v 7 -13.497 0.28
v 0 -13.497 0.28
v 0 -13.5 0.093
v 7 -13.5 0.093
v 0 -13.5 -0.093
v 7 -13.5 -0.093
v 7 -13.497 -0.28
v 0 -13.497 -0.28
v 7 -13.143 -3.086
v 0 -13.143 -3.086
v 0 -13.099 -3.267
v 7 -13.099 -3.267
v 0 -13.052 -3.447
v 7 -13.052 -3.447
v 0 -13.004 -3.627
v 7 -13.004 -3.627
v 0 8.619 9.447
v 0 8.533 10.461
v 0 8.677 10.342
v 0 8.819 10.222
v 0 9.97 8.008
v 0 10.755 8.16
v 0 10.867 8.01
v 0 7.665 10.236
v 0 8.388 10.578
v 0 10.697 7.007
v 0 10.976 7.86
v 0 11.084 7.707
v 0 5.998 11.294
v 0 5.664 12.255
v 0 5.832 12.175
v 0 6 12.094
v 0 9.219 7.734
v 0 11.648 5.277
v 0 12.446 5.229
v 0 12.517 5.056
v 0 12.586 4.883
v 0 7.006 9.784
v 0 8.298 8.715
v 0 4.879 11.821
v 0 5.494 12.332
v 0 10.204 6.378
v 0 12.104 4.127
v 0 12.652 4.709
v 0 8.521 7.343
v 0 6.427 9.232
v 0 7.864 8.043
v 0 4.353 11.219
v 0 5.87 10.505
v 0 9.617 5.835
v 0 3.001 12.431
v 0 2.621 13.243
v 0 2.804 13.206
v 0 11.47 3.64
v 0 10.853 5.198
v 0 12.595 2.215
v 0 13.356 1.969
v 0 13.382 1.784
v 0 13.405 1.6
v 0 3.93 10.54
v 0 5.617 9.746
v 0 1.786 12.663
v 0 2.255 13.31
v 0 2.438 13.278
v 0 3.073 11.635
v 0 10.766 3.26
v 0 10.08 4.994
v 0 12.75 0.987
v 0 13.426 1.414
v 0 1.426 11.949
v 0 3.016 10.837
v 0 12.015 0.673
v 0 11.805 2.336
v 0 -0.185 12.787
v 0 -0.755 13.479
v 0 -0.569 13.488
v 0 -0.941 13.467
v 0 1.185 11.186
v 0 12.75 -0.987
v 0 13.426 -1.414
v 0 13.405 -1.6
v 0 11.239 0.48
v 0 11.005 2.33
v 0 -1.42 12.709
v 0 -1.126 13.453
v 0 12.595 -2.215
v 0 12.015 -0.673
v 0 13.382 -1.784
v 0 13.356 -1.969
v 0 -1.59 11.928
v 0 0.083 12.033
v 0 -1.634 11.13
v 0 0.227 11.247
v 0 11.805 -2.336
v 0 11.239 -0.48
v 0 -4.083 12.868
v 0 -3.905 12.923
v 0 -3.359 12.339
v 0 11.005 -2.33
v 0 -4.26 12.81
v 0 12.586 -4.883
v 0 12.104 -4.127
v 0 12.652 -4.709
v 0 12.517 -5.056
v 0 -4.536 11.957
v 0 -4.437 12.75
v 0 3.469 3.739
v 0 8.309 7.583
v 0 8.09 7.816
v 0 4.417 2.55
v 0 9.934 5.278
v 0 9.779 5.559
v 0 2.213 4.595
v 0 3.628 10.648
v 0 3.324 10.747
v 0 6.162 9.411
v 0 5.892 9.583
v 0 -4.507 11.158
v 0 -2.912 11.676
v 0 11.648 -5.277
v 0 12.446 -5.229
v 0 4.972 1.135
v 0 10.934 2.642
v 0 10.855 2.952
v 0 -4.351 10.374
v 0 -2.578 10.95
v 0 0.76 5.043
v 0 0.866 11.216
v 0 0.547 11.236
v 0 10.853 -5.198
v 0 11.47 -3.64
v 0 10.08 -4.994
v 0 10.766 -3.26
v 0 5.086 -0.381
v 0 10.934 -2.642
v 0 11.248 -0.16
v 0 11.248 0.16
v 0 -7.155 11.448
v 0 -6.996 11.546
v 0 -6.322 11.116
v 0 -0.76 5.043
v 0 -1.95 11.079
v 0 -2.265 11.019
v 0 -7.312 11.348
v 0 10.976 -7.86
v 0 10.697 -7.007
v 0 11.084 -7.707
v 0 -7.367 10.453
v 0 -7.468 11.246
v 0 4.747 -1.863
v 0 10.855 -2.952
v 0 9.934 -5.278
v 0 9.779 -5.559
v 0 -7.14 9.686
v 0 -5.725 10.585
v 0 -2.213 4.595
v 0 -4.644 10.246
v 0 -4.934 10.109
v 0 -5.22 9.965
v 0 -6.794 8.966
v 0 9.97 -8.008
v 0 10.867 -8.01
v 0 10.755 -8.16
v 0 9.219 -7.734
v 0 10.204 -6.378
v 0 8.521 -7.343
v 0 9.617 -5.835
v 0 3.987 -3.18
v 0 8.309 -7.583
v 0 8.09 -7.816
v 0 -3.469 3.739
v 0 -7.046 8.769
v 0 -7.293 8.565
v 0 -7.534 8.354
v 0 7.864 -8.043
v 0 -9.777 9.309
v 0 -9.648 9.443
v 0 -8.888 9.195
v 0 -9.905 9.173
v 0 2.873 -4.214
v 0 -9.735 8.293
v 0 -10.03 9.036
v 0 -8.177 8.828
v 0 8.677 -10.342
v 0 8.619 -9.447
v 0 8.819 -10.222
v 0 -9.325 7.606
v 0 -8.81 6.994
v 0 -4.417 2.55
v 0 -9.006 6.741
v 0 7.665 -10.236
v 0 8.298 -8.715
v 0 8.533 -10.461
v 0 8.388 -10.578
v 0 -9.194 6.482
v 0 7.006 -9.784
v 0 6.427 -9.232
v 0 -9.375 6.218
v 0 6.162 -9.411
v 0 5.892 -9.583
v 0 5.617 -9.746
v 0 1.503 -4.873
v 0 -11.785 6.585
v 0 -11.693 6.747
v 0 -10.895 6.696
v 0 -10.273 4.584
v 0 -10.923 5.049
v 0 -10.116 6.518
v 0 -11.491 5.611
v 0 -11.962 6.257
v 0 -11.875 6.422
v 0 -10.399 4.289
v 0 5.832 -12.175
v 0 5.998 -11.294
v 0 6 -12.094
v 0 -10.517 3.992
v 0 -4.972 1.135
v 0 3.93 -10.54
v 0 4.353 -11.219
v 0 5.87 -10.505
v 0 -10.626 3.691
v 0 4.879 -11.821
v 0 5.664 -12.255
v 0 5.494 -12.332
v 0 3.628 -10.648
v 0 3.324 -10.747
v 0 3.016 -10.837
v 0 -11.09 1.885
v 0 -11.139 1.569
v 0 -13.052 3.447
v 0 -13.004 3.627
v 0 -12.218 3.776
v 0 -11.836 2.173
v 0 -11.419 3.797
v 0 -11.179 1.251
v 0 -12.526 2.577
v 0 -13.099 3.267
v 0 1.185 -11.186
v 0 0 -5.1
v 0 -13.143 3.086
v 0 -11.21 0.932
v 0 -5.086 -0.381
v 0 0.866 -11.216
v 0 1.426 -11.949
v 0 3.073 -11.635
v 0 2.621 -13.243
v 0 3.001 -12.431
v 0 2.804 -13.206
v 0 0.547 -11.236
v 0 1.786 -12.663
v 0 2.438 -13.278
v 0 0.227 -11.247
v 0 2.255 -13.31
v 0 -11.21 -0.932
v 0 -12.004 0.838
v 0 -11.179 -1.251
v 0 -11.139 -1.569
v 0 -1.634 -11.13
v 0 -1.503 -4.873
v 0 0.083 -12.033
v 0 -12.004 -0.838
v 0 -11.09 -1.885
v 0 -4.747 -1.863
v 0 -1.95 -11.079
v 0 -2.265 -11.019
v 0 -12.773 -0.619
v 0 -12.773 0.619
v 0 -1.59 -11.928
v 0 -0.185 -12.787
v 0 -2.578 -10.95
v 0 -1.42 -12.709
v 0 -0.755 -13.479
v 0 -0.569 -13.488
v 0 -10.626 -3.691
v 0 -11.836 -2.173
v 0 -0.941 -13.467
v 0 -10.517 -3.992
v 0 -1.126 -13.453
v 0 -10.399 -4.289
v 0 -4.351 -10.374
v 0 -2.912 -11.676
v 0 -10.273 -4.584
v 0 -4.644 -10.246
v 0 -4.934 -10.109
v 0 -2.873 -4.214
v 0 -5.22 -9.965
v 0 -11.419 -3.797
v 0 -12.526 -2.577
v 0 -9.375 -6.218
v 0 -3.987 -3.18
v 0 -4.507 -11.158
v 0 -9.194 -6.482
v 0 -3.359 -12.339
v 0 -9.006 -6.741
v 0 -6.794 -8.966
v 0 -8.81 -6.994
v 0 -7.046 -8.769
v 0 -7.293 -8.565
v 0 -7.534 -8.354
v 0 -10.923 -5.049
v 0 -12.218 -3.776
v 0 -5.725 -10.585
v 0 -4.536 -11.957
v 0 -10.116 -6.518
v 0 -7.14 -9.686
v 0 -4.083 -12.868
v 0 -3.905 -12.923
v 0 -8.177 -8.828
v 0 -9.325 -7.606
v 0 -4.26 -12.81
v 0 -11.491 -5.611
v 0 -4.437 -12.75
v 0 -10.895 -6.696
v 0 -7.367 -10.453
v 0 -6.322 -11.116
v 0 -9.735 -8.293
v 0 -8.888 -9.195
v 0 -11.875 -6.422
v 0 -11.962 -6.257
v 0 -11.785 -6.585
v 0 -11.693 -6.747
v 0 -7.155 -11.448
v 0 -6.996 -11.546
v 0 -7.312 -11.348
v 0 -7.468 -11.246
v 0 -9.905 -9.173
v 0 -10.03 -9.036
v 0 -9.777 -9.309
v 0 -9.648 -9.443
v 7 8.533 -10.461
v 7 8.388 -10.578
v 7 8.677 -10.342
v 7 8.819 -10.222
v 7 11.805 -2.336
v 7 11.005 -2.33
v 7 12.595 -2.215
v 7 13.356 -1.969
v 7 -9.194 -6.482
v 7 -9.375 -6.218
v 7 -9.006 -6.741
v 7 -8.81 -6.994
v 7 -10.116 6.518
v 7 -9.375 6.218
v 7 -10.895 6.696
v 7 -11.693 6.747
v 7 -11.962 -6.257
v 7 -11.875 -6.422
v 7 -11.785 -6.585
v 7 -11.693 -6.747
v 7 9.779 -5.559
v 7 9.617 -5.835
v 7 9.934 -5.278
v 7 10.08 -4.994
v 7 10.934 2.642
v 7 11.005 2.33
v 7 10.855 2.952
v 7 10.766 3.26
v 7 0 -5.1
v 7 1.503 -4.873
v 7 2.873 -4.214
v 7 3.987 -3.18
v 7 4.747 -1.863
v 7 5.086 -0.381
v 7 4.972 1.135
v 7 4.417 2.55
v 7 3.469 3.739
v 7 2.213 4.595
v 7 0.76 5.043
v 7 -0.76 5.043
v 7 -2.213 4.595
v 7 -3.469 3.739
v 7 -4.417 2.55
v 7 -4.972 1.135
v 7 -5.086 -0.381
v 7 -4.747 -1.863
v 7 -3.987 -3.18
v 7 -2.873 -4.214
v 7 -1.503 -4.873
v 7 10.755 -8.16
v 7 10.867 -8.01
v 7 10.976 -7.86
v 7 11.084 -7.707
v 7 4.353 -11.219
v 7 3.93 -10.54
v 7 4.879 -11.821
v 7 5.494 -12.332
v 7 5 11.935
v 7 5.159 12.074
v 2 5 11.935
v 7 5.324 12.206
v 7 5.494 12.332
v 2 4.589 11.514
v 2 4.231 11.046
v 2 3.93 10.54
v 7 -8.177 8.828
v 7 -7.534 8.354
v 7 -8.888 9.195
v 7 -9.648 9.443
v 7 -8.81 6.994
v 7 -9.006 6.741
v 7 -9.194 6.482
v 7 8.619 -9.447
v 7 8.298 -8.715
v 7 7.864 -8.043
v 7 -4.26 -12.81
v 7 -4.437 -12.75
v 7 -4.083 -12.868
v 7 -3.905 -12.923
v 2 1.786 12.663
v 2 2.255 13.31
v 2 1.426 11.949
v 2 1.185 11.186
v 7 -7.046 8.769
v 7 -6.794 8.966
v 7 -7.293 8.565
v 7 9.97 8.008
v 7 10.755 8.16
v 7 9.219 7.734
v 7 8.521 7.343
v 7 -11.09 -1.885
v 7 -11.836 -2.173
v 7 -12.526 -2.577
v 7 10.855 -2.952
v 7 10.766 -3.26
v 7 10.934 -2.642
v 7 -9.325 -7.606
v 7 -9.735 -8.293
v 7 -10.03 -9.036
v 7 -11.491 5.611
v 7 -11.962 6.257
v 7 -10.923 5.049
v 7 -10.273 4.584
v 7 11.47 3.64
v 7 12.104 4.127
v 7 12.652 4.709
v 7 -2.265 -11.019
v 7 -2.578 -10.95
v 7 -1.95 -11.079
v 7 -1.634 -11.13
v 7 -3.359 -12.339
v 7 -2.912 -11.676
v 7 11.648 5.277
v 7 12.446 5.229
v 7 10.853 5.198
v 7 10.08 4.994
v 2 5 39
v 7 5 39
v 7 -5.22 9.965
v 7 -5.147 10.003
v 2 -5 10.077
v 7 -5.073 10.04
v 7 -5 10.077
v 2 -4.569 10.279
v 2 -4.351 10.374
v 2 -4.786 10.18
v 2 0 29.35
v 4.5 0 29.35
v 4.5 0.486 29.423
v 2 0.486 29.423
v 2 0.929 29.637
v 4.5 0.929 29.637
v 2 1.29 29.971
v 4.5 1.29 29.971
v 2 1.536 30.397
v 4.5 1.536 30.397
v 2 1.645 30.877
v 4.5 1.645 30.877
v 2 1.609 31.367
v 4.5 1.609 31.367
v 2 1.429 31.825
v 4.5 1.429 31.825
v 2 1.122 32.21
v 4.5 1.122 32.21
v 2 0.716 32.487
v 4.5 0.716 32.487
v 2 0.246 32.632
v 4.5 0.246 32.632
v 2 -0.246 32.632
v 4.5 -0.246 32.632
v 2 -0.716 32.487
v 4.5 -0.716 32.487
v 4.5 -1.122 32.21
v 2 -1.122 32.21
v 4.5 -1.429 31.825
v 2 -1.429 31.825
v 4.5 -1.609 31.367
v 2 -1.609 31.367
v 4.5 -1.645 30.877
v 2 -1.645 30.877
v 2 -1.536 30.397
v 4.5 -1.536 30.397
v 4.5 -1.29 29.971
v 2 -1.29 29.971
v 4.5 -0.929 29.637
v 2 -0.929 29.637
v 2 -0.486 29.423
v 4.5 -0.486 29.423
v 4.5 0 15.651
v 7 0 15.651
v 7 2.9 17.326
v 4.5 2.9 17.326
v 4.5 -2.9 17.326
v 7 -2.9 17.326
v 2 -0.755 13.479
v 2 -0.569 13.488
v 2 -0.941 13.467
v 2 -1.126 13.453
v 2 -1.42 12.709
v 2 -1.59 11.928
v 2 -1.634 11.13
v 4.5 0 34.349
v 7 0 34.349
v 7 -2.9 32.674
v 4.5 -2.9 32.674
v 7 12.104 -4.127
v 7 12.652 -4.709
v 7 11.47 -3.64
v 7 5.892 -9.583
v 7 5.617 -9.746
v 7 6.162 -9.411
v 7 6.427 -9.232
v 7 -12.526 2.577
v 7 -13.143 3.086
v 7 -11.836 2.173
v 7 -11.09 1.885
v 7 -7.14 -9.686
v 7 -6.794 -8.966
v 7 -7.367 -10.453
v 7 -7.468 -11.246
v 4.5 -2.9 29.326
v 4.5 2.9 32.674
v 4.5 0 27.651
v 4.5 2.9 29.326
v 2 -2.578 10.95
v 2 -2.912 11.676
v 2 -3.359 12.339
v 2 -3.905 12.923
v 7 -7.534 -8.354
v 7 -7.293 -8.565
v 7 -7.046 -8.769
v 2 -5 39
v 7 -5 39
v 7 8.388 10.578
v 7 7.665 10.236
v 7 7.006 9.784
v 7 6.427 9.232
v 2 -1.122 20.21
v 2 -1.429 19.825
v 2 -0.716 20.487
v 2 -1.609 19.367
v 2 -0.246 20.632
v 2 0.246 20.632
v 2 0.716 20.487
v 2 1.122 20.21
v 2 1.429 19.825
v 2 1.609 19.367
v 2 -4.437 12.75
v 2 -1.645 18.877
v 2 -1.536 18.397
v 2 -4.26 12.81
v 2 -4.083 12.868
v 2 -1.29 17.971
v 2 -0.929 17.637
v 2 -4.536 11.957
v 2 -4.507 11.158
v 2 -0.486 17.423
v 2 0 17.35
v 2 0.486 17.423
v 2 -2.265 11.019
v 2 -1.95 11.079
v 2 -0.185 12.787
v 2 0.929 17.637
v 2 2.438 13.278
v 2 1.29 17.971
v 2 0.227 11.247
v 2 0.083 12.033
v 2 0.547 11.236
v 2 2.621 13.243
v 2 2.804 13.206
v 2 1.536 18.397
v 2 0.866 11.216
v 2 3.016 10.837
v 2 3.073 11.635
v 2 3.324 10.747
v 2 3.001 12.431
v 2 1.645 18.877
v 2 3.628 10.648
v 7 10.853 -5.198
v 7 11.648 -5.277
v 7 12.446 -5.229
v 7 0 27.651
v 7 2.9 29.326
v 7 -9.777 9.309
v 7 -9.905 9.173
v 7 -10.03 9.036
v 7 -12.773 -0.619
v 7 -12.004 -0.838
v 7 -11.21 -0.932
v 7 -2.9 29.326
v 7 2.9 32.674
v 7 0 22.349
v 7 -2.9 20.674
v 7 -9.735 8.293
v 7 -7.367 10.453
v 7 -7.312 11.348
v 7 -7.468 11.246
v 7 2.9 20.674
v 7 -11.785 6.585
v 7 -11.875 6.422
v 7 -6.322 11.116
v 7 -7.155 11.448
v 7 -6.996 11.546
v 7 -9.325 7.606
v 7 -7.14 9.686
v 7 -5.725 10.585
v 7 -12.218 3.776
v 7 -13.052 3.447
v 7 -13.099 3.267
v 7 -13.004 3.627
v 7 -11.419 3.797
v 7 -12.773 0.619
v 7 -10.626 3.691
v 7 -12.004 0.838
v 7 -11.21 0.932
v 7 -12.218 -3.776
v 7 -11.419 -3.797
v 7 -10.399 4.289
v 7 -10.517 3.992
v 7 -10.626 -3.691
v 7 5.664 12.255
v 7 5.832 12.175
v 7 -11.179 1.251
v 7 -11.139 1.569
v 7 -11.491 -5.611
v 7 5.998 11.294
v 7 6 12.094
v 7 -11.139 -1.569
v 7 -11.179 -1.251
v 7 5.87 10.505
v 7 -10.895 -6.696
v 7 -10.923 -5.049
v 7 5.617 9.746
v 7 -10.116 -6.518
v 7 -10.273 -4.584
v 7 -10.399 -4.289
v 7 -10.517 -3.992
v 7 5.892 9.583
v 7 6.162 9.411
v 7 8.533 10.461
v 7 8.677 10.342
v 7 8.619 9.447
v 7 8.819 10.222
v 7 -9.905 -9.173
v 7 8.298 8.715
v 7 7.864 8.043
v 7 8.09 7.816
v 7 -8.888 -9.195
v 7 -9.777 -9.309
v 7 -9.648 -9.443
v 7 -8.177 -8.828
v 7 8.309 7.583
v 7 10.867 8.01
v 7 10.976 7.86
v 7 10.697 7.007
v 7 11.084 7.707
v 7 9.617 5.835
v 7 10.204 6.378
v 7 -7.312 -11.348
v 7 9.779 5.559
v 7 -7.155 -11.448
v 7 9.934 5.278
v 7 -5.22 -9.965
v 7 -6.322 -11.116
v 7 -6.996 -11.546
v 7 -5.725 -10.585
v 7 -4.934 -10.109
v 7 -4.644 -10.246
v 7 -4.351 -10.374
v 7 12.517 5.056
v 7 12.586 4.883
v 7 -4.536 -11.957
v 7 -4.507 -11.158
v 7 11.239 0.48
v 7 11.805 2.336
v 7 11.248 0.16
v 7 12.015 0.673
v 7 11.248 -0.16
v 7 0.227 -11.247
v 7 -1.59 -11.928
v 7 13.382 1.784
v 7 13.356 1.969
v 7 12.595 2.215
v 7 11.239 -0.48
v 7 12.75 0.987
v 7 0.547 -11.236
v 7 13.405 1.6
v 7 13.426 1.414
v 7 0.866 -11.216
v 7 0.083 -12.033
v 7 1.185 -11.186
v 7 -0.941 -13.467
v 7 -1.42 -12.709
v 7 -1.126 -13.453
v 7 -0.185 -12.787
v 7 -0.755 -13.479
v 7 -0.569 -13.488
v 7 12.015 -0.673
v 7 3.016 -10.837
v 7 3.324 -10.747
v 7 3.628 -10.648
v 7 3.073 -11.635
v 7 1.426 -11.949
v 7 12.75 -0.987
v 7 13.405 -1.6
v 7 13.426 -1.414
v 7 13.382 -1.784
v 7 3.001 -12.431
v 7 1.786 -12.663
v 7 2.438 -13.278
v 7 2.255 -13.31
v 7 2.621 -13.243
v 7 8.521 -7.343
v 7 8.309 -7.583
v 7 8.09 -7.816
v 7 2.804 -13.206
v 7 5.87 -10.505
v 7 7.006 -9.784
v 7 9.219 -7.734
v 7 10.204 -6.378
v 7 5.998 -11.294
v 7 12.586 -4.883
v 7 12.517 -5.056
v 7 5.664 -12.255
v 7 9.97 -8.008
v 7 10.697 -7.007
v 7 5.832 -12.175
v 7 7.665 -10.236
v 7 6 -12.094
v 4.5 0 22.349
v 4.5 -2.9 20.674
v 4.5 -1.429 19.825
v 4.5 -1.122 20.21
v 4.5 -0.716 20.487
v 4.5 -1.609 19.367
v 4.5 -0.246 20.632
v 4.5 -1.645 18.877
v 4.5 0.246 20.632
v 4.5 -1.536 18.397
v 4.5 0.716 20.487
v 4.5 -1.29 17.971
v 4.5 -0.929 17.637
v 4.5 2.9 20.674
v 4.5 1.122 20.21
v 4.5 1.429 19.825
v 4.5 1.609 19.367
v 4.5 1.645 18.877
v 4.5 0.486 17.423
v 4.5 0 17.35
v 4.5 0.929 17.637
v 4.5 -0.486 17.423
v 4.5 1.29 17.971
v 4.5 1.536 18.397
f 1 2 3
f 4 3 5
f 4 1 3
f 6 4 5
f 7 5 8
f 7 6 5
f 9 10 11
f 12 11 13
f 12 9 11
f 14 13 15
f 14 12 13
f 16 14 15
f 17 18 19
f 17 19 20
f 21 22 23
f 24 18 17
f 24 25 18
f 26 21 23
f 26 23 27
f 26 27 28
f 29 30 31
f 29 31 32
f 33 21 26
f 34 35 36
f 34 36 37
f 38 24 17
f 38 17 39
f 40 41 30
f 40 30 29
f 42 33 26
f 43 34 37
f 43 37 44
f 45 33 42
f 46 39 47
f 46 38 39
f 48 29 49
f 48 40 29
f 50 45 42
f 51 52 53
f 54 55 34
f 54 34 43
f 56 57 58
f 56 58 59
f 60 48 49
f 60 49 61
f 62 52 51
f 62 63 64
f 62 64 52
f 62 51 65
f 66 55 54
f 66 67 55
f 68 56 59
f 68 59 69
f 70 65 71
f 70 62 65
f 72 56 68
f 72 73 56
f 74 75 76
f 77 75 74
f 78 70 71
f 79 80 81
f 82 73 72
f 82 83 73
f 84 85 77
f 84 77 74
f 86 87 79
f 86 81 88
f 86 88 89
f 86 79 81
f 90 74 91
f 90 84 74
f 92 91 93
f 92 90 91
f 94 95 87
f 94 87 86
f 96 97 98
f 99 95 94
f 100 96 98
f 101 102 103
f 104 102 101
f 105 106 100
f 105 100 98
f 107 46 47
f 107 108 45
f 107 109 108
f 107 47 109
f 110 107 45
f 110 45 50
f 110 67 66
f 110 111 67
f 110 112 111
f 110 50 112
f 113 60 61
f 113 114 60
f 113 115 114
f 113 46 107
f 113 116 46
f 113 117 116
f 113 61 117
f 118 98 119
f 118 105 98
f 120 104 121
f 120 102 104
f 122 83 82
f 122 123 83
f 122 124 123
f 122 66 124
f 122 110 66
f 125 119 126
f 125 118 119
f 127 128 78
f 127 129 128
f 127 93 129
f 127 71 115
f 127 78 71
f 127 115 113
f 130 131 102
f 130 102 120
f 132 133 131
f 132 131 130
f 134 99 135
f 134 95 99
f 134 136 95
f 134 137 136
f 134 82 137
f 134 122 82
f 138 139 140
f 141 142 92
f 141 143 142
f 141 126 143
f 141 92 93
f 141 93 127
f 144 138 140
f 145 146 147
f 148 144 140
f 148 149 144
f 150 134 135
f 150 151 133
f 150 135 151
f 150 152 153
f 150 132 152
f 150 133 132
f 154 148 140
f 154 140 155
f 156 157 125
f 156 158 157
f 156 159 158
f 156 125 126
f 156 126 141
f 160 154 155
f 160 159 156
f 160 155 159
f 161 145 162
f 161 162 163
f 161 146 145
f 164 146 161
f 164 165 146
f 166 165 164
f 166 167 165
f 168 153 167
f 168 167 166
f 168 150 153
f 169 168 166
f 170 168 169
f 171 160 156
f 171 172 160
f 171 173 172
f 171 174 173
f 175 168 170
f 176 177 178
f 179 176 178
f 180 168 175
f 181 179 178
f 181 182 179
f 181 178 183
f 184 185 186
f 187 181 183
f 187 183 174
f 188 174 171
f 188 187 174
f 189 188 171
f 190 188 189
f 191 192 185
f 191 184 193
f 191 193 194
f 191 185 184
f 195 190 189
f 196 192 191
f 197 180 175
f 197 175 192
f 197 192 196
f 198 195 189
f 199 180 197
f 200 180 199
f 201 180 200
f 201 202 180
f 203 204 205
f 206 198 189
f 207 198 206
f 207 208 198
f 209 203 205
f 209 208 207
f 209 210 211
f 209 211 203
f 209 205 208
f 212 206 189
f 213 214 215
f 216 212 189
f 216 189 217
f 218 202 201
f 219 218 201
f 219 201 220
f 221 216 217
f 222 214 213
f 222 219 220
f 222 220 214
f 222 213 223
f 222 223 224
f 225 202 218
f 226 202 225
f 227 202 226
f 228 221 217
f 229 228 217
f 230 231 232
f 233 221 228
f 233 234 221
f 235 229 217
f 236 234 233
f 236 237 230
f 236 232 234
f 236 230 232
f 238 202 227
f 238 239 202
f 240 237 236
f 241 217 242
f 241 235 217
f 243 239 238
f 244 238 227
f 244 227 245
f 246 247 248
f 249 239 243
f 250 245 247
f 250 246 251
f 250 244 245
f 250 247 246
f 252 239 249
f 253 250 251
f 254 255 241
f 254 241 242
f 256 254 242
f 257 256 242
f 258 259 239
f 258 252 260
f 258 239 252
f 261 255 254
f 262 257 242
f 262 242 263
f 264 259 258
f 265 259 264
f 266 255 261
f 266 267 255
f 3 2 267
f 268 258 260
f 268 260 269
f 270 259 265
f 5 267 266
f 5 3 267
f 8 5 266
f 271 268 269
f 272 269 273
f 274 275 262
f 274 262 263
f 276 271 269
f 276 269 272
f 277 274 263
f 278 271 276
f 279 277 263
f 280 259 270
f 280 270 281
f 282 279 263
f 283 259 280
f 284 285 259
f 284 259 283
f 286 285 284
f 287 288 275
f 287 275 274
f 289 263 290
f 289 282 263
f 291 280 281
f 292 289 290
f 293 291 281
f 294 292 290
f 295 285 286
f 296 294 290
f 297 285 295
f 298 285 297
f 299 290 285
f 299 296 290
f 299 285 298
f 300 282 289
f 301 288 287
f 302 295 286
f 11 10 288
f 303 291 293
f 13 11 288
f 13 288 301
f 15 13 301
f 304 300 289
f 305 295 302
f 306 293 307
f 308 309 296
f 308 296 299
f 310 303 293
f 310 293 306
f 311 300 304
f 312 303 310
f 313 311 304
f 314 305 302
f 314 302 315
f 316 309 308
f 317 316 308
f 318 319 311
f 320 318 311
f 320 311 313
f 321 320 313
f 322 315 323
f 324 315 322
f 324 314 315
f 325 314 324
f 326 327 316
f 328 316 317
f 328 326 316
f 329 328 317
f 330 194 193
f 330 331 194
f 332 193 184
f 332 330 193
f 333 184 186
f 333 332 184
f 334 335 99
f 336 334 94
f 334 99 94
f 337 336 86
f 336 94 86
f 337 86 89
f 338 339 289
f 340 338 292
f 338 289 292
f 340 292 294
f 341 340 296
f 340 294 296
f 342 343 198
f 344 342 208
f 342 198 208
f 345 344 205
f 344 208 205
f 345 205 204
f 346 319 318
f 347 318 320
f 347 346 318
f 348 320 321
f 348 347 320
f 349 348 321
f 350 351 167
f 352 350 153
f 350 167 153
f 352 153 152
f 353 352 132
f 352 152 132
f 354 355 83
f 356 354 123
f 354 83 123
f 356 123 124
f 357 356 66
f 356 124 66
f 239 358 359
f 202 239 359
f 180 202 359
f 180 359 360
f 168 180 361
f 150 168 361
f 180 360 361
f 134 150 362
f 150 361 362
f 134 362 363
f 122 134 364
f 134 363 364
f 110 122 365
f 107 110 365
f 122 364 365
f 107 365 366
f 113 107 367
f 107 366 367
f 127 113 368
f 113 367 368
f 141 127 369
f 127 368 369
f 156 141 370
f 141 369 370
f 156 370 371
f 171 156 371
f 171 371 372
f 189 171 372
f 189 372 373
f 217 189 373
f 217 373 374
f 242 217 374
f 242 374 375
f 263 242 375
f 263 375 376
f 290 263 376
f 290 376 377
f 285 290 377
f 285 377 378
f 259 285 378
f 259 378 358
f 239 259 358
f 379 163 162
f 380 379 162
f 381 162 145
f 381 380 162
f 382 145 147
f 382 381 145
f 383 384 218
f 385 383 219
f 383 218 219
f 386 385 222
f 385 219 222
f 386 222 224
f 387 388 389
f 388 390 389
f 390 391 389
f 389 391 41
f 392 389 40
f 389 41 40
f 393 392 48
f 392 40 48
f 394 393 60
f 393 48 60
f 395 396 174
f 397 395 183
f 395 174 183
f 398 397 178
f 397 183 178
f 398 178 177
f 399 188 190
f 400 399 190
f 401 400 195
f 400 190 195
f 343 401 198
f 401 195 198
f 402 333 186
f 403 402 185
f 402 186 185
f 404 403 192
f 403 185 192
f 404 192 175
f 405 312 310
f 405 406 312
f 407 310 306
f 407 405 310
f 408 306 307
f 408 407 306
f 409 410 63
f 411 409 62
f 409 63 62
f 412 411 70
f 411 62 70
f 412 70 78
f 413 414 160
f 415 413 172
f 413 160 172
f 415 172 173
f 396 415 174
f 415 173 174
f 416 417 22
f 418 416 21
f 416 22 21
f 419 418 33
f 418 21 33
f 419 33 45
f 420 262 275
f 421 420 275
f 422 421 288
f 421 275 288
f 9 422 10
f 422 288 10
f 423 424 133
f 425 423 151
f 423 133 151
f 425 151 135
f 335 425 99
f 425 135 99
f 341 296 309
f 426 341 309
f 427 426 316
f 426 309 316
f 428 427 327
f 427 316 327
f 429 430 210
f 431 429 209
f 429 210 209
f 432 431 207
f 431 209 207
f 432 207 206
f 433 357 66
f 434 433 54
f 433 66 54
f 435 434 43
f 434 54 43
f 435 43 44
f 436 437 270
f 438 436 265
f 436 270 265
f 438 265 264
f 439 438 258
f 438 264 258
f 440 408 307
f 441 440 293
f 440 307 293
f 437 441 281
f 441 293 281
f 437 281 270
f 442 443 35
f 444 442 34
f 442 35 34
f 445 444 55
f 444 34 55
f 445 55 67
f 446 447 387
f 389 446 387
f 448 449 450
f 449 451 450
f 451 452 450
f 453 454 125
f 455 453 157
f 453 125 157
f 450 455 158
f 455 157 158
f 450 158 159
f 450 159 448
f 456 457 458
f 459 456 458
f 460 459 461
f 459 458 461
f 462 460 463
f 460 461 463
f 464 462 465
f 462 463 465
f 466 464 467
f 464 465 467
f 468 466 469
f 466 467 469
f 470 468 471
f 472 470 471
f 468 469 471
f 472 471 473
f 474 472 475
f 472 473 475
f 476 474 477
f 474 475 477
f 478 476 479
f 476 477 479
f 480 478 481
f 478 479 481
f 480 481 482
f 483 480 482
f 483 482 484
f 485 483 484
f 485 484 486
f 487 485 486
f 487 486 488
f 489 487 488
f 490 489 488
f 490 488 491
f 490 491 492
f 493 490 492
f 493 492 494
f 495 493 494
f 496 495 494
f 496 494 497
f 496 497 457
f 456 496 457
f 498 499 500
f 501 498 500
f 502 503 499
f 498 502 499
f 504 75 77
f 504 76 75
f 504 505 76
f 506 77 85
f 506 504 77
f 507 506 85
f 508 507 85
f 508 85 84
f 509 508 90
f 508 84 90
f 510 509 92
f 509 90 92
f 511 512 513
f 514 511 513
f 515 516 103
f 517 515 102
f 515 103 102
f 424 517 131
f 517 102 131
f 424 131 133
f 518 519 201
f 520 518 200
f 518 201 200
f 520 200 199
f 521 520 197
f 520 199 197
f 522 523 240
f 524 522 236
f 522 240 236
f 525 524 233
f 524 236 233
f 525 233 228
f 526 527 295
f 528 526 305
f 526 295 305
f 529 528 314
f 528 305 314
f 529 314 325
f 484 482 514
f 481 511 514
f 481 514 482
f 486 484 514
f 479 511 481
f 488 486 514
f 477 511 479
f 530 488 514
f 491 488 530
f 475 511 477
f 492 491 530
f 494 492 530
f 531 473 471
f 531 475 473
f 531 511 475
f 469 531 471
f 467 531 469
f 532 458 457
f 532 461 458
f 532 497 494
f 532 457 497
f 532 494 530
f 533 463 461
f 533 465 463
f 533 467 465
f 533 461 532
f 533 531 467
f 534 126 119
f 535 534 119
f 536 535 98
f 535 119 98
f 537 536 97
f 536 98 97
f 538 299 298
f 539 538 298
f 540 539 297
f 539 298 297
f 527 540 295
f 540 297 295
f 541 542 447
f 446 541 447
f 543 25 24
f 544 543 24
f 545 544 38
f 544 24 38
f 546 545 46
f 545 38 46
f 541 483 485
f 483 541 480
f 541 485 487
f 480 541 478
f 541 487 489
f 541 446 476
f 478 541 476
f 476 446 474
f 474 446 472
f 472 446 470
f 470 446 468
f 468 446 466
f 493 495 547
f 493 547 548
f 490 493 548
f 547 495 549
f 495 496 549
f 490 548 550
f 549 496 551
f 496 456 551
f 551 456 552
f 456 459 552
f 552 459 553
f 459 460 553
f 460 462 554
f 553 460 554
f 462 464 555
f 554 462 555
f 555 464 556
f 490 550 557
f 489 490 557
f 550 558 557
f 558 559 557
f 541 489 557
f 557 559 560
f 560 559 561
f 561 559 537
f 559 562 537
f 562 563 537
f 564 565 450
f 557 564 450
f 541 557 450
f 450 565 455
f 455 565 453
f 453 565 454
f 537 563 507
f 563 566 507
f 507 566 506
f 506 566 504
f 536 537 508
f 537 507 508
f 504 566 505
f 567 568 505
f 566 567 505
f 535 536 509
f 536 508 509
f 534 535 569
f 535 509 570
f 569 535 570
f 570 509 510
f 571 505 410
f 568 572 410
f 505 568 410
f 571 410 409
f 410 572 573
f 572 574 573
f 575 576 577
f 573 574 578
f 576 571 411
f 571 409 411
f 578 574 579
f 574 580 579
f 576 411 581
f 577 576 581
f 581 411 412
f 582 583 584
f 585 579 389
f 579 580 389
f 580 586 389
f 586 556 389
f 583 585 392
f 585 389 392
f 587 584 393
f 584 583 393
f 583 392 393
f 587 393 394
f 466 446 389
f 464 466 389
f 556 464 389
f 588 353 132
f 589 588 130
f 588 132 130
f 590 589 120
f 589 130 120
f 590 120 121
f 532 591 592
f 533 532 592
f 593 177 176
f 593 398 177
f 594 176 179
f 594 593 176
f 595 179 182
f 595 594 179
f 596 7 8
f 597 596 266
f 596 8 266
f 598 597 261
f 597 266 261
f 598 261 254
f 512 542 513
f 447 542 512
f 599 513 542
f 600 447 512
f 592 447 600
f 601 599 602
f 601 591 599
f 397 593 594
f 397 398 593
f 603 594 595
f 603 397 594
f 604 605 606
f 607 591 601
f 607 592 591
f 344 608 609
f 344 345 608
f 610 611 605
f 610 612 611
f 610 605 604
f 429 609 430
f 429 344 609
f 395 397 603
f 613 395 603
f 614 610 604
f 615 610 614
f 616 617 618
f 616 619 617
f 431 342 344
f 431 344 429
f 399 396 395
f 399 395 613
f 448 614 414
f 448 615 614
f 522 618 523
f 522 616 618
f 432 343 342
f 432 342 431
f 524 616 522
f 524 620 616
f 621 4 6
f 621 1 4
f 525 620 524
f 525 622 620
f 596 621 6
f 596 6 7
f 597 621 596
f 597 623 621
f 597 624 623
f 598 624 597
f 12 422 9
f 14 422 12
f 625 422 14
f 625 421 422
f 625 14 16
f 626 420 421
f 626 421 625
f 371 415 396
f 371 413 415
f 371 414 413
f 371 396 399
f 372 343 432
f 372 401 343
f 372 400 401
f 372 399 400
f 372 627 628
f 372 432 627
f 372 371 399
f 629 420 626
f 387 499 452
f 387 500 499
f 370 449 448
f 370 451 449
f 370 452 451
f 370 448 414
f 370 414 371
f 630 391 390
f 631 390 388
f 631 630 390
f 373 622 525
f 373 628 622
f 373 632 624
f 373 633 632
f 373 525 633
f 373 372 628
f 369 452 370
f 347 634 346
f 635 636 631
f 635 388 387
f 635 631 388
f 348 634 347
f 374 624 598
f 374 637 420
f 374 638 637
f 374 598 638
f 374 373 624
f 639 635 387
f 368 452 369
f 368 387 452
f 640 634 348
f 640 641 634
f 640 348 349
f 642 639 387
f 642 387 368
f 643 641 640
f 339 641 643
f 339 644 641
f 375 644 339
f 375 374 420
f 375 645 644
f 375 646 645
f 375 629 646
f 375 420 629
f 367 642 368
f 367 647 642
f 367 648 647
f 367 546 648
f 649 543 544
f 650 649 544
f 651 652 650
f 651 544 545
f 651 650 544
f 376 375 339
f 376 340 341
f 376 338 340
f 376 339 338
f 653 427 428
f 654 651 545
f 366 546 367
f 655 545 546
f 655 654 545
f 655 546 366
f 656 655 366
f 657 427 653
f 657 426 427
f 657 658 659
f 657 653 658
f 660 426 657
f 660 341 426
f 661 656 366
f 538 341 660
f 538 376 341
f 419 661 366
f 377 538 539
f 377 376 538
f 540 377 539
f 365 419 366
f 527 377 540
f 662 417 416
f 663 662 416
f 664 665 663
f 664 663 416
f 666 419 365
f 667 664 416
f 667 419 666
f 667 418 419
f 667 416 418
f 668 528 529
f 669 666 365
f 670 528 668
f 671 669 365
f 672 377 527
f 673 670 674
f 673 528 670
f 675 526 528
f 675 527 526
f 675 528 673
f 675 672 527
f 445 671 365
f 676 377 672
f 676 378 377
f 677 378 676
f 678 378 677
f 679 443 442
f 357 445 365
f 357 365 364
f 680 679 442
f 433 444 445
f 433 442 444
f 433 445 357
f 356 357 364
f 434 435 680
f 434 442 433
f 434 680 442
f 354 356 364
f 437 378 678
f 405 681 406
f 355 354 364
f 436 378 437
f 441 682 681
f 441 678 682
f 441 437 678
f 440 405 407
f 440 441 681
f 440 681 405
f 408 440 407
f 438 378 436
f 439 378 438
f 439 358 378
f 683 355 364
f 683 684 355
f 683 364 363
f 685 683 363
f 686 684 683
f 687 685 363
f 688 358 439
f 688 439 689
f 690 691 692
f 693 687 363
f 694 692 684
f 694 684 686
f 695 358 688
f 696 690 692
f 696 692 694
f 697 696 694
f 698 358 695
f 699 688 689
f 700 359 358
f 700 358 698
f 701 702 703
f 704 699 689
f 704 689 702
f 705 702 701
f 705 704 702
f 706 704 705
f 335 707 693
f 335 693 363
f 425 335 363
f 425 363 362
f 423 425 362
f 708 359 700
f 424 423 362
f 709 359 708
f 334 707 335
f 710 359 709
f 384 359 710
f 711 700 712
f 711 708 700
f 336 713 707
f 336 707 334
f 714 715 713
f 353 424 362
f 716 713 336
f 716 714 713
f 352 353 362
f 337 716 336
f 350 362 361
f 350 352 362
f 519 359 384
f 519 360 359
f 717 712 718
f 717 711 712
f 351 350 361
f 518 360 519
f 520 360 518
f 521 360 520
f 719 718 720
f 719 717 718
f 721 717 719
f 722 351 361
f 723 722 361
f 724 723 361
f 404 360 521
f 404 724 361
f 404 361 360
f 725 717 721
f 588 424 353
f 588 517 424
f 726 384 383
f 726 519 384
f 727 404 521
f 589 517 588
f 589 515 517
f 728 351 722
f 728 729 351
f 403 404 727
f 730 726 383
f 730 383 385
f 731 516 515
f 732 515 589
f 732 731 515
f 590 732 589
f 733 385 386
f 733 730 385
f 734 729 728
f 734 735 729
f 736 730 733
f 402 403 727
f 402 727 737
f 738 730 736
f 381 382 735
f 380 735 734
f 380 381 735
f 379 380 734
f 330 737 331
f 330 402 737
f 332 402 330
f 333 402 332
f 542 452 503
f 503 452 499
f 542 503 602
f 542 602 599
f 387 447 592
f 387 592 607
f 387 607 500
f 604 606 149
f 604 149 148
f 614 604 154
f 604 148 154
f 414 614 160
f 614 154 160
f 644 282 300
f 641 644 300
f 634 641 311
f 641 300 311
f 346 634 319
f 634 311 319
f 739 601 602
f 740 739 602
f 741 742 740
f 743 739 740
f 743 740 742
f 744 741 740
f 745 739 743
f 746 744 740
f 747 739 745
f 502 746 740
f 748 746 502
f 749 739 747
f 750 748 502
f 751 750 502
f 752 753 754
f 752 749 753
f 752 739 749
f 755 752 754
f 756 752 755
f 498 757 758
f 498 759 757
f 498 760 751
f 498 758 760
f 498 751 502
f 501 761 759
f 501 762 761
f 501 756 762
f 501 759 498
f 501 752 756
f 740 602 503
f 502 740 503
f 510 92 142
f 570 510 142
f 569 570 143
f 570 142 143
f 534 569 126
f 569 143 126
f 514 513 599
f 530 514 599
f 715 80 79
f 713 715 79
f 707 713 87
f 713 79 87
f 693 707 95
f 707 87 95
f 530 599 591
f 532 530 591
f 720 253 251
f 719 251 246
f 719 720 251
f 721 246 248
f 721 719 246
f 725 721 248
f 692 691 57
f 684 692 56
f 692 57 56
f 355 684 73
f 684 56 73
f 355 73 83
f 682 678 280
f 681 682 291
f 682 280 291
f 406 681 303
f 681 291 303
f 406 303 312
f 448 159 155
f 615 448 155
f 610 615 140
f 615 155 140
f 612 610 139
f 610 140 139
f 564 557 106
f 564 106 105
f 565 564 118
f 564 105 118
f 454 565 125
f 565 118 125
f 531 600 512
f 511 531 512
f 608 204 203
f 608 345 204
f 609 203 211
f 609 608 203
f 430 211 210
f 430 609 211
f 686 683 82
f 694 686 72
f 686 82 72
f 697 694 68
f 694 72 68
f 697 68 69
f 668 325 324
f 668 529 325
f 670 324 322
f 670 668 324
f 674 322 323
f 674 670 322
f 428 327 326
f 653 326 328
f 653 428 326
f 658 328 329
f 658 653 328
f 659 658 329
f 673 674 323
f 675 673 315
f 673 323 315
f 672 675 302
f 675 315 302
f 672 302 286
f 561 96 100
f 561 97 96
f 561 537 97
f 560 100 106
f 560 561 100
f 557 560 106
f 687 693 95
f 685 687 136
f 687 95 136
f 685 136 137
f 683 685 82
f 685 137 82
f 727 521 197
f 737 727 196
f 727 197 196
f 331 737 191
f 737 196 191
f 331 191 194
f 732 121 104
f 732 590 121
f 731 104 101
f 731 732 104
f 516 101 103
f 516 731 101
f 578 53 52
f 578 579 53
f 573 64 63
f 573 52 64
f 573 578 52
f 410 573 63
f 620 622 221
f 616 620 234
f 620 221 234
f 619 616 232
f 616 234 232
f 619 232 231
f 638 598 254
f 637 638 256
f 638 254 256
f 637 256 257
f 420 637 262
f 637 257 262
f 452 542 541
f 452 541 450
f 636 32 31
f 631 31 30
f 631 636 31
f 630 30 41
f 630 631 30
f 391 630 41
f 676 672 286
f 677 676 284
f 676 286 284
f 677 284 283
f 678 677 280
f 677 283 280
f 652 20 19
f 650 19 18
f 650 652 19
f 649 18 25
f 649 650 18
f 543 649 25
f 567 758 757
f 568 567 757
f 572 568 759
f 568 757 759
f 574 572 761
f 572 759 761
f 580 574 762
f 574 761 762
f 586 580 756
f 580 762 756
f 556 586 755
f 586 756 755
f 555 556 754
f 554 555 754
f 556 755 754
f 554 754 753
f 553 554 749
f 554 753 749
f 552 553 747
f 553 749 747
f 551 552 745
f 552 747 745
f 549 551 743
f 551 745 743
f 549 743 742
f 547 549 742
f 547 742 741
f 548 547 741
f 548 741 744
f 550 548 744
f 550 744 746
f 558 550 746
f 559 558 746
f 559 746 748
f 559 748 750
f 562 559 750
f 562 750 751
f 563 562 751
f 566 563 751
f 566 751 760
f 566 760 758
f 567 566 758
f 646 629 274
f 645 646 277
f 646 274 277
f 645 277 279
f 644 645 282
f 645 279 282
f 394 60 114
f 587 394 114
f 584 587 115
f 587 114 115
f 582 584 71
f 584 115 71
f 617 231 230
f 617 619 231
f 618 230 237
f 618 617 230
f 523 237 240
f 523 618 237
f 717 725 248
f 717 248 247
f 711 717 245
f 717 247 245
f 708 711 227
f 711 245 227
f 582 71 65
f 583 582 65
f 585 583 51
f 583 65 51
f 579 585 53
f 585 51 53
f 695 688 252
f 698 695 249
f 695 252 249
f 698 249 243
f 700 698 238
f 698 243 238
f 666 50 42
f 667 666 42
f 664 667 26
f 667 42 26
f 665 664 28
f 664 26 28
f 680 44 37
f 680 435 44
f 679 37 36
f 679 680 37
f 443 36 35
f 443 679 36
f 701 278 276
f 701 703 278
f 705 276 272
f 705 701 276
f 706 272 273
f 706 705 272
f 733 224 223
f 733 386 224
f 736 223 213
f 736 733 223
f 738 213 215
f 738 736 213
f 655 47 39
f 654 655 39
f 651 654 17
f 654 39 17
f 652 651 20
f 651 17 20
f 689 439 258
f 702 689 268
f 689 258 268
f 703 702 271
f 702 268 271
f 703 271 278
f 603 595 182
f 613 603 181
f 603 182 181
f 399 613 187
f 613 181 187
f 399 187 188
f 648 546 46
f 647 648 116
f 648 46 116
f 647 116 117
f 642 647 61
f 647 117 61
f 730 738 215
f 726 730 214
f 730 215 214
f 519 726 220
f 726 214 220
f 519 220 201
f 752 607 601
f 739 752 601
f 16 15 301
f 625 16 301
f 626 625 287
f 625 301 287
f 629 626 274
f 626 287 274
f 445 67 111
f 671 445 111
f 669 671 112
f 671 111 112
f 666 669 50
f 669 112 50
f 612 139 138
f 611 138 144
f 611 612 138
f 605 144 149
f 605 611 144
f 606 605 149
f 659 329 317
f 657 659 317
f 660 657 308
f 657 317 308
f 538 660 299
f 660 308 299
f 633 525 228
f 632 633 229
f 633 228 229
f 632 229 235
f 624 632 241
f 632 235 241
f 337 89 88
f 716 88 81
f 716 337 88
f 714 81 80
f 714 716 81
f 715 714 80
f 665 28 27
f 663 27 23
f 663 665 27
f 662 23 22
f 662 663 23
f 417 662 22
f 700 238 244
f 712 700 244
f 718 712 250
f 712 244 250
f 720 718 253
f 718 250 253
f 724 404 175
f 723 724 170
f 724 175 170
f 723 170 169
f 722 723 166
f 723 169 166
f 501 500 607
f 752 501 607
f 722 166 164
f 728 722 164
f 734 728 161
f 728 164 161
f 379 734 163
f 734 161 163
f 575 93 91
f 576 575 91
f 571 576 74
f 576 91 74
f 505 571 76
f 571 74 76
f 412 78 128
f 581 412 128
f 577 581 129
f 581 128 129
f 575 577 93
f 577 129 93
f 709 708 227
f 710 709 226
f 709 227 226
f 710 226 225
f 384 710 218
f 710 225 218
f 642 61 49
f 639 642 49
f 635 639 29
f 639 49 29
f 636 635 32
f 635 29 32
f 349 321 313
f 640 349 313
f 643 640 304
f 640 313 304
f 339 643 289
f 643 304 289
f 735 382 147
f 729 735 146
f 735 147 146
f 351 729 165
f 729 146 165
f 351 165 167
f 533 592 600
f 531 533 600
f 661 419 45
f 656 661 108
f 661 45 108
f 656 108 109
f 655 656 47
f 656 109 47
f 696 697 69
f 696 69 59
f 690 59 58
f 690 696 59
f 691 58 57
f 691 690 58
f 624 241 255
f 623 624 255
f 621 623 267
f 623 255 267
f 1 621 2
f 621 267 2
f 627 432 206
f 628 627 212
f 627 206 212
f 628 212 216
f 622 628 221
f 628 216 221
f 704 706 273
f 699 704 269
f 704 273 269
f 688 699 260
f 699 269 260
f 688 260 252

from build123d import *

# Parameters (mm, degrees)
BASPROSKE_W         = 7
BASPROSKE_H         = 13.5
TOOTHCUT_DEPTH      = 21.334699408
TEETHCUTS_COUNT     = 25
TEETHCUTS_ANGLE     = 345.6
BORSKE_R            = 0.4
BORE_DEPTH          = 50.0000508
SKETCH_1_R          = 5.1
CUT_EXTRUDE_1_DEPTH = 10
SKETCH_2_W          = 30
SKETCH_2_H          = 10
SKETCH_2_R          = 1.65
EXTRUDE_2_DEPTH     = 5
CUT_EXTRUDE_2_DEPTH = 2.5


with BuildPart() as part:
    # BasProSke → Base-Revolve (revolve)
    with BuildSketch(Plane(origin=(0, 0, 0), x_dir=(1, 0, 0), z_dir=(0, 1, 0)), mode=Mode.PRIVATE) as base_revolve_sk:
        with Locations((3.5, 6.75)):
            Rectangle(BASPROSKE_W, BASPROSKE_H)
    revolve(base_revolve_sk.sketch.rotate(Axis((-10, 0, 0), (1, 0, 0)), 180), axis=Axis((-10, 0, 0), (1, 0, 0)))

    # TooCutSke → ToothCut (cut, through all)
    with BuildSketch(Plane(origin=(0, 0, 0), x_dir=(0, 0, -1), z_dir=(1, 0, 0))):
        with BuildLine():
            ThreePointArc((0.480087995, 11.238750665), (0, 11.249), (-0.480087995, 11.238750665))
            ThreePointArc((-0.480087995, 11.238750665), (-0.821124963, 12.40220054), (-1.432168974, 13.449361962))
            ThreePointArc((-1.432168974, 13.449361962), (0, 13.5254), (1.432168974, 13.449361962))
            ThreePointArc((1.432168974, 13.449361962), (0.821124963, 12.40220054), (0.480087995, 11.238750665))
        make_face()
    toothcut = extrude(amount=TOOTHCUT_DEPTH, mode=Mode.SUBTRACT)

    # TeethCuts: ToothCut ×25 about axis
    teethcuts_axis = Axis((-10, 0, 0), (1, 0, 0))
    for i in range(1, TEETHCUTS_COUNT):
        add(toothcut.rotate(teethcuts_axis, i * TEETHCUTS_ANGLE / (TEETHCUTS_COUNT - 1)), mode=Mode.SUBTRACT)

    # BorSke → Bore (cut, symmetric)
    with BuildSketch(Plane(origin=(0, 0, 0), x_dir=(0, 0, -1), z_dir=(1, 0, 0))):
        with Locations(Location((0, 0, 0), (0, 0, 180))):
            Circle(BORSKE_R)
    extrude(amount=BORE_DEPTH, both=True, mode=Mode.SUBTRACT)

    # 草图1 → 切除-拉伸1 (cut)
    with BuildSketch(Plane(origin=(7, 0, 0), x_dir=(0, 0, -1), z_dir=(1, 0, 0))):
        Circle(SKETCH_1_R)
    extrude(amount=-CUT_EXTRUDE_1_DEPTH, mode=Mode.SUBTRACT)

    # 草图2 → 凸台-拉伸2 (add)
    with BuildSketch(Plane(origin=(7, 0, 0), x_dir=(0, 0, -1), z_dir=(1, 0, 0))):
        with Locations((-24, 0)):
            Rectangle(SKETCH_2_W, SKETCH_2_H)
        with Locations((-31, 0)):
            Circle(SKETCH_2_R, mode=Mode.SUBTRACT)
        with Locations((-19, 0)):
            Circle(SKETCH_2_R, mode=Mode.SUBTRACT)
    extrude(amount=-EXTRUDE_2_DEPTH)

    # 草图3 → 切除-拉伸2 (cut)
    with BuildSketch(Plane(origin=(7, 0, 0), x_dir=(0, 0, -1), z_dir=(1, 0, 0))):
        Polygon((-27.651368439, 0), (-29.325684219, 2.9), (-32.674315781, 2.9), (-34.348631561, 0), (-32.674315781, -2.9), (-29.325684219, -2.9), align=None)
        Polygon((-15.651368439, 0), (-17.325684219, 2.9), (-20.674315781, 2.9), (-22.348631561, 0), (-20.674315781, -2.9), (-17.325684219, -2.9), align=None)
    extrude(amount=-CUT_EXTRUDE_2_DEPTH, mode=Mode.SUBTRACT)


solid = part.part
